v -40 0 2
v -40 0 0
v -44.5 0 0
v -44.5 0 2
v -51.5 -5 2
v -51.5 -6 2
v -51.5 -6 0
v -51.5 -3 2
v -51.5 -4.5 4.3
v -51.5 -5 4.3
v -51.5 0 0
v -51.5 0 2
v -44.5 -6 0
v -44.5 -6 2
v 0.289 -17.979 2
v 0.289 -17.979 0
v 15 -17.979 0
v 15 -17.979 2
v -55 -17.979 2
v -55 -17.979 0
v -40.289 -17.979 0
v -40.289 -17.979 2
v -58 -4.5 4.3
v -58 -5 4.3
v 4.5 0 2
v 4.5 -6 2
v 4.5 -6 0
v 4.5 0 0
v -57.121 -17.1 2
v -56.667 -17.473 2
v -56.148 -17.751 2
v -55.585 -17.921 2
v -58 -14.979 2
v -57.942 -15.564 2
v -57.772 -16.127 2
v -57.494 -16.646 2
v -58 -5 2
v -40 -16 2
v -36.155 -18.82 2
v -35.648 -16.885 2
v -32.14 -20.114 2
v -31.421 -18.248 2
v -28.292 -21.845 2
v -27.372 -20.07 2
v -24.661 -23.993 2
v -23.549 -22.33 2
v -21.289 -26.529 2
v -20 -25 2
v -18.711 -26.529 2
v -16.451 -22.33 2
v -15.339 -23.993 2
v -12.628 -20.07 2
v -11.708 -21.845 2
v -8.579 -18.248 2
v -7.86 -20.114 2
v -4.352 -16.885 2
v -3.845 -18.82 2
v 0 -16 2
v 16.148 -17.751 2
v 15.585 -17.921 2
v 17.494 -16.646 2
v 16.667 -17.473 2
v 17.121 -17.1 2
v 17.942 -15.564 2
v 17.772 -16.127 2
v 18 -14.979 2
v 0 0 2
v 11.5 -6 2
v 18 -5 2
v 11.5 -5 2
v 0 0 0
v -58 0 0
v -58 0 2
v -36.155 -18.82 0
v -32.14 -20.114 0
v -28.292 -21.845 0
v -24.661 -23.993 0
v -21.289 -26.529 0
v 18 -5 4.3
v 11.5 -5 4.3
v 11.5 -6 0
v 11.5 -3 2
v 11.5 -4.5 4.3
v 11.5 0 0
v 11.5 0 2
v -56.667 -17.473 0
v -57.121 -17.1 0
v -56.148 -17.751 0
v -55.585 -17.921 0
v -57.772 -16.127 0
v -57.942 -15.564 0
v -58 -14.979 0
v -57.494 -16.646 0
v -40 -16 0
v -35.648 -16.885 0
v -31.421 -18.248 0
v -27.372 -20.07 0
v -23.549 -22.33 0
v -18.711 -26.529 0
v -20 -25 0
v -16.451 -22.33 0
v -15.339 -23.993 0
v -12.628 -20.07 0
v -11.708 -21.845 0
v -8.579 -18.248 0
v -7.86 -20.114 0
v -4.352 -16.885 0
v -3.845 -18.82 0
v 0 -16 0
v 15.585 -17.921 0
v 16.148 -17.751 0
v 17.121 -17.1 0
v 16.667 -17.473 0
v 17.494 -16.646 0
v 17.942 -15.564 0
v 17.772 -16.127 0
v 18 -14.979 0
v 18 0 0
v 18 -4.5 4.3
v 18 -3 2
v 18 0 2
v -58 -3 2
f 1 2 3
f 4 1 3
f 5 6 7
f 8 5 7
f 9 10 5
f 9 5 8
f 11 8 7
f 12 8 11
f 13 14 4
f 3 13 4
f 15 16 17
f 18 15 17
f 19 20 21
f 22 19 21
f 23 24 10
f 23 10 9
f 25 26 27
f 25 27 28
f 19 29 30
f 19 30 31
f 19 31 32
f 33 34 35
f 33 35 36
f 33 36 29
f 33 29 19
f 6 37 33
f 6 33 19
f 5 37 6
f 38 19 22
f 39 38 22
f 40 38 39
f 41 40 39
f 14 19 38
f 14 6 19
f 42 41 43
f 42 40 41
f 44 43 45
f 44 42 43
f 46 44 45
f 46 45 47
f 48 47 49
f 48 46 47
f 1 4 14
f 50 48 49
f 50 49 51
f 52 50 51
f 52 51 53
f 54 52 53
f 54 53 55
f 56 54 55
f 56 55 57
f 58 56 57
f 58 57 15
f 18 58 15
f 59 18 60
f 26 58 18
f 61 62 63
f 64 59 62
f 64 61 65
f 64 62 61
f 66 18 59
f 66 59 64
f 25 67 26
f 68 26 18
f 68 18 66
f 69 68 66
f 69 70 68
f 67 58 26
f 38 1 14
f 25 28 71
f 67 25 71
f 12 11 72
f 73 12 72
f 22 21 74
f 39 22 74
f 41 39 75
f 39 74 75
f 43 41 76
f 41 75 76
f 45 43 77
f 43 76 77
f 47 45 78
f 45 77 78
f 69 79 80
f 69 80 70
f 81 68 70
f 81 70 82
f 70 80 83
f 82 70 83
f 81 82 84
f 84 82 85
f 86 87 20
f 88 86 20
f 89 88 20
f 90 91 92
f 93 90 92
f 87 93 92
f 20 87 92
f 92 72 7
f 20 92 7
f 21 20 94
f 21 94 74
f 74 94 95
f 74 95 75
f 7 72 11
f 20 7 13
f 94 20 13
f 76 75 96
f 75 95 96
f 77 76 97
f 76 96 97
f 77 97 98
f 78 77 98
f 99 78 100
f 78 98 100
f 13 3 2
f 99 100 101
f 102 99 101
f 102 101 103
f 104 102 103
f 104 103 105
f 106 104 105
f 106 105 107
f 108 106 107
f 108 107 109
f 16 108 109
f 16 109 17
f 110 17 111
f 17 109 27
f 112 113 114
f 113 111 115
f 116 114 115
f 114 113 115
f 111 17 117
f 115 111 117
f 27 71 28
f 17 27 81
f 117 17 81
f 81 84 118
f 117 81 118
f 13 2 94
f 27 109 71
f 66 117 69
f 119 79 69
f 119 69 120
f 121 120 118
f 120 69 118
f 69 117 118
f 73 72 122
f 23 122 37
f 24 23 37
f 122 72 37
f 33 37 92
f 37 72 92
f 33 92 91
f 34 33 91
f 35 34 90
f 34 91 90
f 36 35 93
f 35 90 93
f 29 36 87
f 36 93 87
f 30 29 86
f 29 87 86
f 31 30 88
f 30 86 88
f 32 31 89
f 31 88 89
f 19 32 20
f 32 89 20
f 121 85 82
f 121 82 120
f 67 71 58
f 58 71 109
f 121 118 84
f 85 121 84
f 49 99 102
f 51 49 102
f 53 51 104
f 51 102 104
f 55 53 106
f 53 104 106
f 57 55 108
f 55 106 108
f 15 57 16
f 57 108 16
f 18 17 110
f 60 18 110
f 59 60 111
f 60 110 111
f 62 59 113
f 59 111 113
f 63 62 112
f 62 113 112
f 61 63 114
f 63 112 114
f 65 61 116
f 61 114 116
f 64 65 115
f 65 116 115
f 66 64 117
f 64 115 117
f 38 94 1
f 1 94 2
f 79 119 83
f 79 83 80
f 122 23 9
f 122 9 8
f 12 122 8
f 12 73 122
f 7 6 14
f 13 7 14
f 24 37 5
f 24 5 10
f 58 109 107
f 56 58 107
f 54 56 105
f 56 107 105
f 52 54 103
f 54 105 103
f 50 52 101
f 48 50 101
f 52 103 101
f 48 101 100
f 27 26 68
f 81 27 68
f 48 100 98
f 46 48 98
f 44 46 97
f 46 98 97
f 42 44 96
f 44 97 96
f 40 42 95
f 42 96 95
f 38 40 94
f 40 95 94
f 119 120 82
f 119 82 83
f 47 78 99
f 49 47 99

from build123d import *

# Parameters (mm, degrees)
F1_DEPTH = 2
F2_W     = 7
F2_H     = 6
F3_DEPTH = 2
F5_DEPTH = 6.5
F7_DEPTH = 6.5


with BuildPart() as f1:
    # F0 (on Top) → F1 (new body)
    with BuildSketch(Plane.XY):
        with BuildLine():
            Line((-40, -16), (-40, 0))
            Line((-40, 0), (-58, 0))
            Line((-58, 0), (-58, -14.978968))
            ThreePointArc((-58, -14.978968), (-57.12132, -17.100288), (-55, -17.978968))
            Line((-55, -17.978968), (-40.289286, -17.978968))
            ThreePointArc((-40.289286, -17.978968), (-30.191853, -20.92634), (-21.289286, -26.528968))
            Line((-21.289286, -26.528968), (-18.710714, -26.528968))
            ThreePointArc((-18.710714, -26.528968), (-9.808147, -20.92634), (0.289286, -17.978968))
            Line((0.289286, -17.978968), (15, -17.978968))
            ThreePointArc((15, -17.978968), (17.12132, -17.100288), (18, -14.978968))
            Line((18, -14.978968), (18, 0))
            Line((18, 0), (0, 0))
            Line((0, 0), (0, -16))
            ThreePointArc((0, -16), (-10.628876, -19.102497), (-20, -25))
            ThreePointArc((-20, -25), (-29.371124, -19.102497), (-40, -16))
        make_face()
    extrude(amount=F1_DEPTH)

    # F2 (on face) → F3 (cut, through all)
    with BuildSketch(Plane.XY.offset(2)):
        with Locations((-48, -3)):
            Rectangle(F2_W, F2_H)
        with Locations((8, -3)):
            Rectangle(F2_W, F2_H)
    extrude(amount=-F3_DEPTH, mode=Mode.SUBTRACT)

    # F4 (on face) → F5 (join, through all)
    with BuildSketch(Plane(origin=(-58, 0, 0), x_dir=(0, -1, 0), z_dir=(-1, 0, 0))):
        Polygon((4.5, 4.3), (3, 2), (5, 2), (5, 4.3), align=None)
    extrude(amount=-F5_DEPTH)

    # F6 (on face) → F7 (join, through all)
    with BuildSketch(Plane.YZ.offset(18)):
        Polygon((-3, 2), (-4.5, 4.3), (-5, 4.3), (-5, 2), align=None)
    extrude(amount=-F7_DEPTH)


solid = f1.part
